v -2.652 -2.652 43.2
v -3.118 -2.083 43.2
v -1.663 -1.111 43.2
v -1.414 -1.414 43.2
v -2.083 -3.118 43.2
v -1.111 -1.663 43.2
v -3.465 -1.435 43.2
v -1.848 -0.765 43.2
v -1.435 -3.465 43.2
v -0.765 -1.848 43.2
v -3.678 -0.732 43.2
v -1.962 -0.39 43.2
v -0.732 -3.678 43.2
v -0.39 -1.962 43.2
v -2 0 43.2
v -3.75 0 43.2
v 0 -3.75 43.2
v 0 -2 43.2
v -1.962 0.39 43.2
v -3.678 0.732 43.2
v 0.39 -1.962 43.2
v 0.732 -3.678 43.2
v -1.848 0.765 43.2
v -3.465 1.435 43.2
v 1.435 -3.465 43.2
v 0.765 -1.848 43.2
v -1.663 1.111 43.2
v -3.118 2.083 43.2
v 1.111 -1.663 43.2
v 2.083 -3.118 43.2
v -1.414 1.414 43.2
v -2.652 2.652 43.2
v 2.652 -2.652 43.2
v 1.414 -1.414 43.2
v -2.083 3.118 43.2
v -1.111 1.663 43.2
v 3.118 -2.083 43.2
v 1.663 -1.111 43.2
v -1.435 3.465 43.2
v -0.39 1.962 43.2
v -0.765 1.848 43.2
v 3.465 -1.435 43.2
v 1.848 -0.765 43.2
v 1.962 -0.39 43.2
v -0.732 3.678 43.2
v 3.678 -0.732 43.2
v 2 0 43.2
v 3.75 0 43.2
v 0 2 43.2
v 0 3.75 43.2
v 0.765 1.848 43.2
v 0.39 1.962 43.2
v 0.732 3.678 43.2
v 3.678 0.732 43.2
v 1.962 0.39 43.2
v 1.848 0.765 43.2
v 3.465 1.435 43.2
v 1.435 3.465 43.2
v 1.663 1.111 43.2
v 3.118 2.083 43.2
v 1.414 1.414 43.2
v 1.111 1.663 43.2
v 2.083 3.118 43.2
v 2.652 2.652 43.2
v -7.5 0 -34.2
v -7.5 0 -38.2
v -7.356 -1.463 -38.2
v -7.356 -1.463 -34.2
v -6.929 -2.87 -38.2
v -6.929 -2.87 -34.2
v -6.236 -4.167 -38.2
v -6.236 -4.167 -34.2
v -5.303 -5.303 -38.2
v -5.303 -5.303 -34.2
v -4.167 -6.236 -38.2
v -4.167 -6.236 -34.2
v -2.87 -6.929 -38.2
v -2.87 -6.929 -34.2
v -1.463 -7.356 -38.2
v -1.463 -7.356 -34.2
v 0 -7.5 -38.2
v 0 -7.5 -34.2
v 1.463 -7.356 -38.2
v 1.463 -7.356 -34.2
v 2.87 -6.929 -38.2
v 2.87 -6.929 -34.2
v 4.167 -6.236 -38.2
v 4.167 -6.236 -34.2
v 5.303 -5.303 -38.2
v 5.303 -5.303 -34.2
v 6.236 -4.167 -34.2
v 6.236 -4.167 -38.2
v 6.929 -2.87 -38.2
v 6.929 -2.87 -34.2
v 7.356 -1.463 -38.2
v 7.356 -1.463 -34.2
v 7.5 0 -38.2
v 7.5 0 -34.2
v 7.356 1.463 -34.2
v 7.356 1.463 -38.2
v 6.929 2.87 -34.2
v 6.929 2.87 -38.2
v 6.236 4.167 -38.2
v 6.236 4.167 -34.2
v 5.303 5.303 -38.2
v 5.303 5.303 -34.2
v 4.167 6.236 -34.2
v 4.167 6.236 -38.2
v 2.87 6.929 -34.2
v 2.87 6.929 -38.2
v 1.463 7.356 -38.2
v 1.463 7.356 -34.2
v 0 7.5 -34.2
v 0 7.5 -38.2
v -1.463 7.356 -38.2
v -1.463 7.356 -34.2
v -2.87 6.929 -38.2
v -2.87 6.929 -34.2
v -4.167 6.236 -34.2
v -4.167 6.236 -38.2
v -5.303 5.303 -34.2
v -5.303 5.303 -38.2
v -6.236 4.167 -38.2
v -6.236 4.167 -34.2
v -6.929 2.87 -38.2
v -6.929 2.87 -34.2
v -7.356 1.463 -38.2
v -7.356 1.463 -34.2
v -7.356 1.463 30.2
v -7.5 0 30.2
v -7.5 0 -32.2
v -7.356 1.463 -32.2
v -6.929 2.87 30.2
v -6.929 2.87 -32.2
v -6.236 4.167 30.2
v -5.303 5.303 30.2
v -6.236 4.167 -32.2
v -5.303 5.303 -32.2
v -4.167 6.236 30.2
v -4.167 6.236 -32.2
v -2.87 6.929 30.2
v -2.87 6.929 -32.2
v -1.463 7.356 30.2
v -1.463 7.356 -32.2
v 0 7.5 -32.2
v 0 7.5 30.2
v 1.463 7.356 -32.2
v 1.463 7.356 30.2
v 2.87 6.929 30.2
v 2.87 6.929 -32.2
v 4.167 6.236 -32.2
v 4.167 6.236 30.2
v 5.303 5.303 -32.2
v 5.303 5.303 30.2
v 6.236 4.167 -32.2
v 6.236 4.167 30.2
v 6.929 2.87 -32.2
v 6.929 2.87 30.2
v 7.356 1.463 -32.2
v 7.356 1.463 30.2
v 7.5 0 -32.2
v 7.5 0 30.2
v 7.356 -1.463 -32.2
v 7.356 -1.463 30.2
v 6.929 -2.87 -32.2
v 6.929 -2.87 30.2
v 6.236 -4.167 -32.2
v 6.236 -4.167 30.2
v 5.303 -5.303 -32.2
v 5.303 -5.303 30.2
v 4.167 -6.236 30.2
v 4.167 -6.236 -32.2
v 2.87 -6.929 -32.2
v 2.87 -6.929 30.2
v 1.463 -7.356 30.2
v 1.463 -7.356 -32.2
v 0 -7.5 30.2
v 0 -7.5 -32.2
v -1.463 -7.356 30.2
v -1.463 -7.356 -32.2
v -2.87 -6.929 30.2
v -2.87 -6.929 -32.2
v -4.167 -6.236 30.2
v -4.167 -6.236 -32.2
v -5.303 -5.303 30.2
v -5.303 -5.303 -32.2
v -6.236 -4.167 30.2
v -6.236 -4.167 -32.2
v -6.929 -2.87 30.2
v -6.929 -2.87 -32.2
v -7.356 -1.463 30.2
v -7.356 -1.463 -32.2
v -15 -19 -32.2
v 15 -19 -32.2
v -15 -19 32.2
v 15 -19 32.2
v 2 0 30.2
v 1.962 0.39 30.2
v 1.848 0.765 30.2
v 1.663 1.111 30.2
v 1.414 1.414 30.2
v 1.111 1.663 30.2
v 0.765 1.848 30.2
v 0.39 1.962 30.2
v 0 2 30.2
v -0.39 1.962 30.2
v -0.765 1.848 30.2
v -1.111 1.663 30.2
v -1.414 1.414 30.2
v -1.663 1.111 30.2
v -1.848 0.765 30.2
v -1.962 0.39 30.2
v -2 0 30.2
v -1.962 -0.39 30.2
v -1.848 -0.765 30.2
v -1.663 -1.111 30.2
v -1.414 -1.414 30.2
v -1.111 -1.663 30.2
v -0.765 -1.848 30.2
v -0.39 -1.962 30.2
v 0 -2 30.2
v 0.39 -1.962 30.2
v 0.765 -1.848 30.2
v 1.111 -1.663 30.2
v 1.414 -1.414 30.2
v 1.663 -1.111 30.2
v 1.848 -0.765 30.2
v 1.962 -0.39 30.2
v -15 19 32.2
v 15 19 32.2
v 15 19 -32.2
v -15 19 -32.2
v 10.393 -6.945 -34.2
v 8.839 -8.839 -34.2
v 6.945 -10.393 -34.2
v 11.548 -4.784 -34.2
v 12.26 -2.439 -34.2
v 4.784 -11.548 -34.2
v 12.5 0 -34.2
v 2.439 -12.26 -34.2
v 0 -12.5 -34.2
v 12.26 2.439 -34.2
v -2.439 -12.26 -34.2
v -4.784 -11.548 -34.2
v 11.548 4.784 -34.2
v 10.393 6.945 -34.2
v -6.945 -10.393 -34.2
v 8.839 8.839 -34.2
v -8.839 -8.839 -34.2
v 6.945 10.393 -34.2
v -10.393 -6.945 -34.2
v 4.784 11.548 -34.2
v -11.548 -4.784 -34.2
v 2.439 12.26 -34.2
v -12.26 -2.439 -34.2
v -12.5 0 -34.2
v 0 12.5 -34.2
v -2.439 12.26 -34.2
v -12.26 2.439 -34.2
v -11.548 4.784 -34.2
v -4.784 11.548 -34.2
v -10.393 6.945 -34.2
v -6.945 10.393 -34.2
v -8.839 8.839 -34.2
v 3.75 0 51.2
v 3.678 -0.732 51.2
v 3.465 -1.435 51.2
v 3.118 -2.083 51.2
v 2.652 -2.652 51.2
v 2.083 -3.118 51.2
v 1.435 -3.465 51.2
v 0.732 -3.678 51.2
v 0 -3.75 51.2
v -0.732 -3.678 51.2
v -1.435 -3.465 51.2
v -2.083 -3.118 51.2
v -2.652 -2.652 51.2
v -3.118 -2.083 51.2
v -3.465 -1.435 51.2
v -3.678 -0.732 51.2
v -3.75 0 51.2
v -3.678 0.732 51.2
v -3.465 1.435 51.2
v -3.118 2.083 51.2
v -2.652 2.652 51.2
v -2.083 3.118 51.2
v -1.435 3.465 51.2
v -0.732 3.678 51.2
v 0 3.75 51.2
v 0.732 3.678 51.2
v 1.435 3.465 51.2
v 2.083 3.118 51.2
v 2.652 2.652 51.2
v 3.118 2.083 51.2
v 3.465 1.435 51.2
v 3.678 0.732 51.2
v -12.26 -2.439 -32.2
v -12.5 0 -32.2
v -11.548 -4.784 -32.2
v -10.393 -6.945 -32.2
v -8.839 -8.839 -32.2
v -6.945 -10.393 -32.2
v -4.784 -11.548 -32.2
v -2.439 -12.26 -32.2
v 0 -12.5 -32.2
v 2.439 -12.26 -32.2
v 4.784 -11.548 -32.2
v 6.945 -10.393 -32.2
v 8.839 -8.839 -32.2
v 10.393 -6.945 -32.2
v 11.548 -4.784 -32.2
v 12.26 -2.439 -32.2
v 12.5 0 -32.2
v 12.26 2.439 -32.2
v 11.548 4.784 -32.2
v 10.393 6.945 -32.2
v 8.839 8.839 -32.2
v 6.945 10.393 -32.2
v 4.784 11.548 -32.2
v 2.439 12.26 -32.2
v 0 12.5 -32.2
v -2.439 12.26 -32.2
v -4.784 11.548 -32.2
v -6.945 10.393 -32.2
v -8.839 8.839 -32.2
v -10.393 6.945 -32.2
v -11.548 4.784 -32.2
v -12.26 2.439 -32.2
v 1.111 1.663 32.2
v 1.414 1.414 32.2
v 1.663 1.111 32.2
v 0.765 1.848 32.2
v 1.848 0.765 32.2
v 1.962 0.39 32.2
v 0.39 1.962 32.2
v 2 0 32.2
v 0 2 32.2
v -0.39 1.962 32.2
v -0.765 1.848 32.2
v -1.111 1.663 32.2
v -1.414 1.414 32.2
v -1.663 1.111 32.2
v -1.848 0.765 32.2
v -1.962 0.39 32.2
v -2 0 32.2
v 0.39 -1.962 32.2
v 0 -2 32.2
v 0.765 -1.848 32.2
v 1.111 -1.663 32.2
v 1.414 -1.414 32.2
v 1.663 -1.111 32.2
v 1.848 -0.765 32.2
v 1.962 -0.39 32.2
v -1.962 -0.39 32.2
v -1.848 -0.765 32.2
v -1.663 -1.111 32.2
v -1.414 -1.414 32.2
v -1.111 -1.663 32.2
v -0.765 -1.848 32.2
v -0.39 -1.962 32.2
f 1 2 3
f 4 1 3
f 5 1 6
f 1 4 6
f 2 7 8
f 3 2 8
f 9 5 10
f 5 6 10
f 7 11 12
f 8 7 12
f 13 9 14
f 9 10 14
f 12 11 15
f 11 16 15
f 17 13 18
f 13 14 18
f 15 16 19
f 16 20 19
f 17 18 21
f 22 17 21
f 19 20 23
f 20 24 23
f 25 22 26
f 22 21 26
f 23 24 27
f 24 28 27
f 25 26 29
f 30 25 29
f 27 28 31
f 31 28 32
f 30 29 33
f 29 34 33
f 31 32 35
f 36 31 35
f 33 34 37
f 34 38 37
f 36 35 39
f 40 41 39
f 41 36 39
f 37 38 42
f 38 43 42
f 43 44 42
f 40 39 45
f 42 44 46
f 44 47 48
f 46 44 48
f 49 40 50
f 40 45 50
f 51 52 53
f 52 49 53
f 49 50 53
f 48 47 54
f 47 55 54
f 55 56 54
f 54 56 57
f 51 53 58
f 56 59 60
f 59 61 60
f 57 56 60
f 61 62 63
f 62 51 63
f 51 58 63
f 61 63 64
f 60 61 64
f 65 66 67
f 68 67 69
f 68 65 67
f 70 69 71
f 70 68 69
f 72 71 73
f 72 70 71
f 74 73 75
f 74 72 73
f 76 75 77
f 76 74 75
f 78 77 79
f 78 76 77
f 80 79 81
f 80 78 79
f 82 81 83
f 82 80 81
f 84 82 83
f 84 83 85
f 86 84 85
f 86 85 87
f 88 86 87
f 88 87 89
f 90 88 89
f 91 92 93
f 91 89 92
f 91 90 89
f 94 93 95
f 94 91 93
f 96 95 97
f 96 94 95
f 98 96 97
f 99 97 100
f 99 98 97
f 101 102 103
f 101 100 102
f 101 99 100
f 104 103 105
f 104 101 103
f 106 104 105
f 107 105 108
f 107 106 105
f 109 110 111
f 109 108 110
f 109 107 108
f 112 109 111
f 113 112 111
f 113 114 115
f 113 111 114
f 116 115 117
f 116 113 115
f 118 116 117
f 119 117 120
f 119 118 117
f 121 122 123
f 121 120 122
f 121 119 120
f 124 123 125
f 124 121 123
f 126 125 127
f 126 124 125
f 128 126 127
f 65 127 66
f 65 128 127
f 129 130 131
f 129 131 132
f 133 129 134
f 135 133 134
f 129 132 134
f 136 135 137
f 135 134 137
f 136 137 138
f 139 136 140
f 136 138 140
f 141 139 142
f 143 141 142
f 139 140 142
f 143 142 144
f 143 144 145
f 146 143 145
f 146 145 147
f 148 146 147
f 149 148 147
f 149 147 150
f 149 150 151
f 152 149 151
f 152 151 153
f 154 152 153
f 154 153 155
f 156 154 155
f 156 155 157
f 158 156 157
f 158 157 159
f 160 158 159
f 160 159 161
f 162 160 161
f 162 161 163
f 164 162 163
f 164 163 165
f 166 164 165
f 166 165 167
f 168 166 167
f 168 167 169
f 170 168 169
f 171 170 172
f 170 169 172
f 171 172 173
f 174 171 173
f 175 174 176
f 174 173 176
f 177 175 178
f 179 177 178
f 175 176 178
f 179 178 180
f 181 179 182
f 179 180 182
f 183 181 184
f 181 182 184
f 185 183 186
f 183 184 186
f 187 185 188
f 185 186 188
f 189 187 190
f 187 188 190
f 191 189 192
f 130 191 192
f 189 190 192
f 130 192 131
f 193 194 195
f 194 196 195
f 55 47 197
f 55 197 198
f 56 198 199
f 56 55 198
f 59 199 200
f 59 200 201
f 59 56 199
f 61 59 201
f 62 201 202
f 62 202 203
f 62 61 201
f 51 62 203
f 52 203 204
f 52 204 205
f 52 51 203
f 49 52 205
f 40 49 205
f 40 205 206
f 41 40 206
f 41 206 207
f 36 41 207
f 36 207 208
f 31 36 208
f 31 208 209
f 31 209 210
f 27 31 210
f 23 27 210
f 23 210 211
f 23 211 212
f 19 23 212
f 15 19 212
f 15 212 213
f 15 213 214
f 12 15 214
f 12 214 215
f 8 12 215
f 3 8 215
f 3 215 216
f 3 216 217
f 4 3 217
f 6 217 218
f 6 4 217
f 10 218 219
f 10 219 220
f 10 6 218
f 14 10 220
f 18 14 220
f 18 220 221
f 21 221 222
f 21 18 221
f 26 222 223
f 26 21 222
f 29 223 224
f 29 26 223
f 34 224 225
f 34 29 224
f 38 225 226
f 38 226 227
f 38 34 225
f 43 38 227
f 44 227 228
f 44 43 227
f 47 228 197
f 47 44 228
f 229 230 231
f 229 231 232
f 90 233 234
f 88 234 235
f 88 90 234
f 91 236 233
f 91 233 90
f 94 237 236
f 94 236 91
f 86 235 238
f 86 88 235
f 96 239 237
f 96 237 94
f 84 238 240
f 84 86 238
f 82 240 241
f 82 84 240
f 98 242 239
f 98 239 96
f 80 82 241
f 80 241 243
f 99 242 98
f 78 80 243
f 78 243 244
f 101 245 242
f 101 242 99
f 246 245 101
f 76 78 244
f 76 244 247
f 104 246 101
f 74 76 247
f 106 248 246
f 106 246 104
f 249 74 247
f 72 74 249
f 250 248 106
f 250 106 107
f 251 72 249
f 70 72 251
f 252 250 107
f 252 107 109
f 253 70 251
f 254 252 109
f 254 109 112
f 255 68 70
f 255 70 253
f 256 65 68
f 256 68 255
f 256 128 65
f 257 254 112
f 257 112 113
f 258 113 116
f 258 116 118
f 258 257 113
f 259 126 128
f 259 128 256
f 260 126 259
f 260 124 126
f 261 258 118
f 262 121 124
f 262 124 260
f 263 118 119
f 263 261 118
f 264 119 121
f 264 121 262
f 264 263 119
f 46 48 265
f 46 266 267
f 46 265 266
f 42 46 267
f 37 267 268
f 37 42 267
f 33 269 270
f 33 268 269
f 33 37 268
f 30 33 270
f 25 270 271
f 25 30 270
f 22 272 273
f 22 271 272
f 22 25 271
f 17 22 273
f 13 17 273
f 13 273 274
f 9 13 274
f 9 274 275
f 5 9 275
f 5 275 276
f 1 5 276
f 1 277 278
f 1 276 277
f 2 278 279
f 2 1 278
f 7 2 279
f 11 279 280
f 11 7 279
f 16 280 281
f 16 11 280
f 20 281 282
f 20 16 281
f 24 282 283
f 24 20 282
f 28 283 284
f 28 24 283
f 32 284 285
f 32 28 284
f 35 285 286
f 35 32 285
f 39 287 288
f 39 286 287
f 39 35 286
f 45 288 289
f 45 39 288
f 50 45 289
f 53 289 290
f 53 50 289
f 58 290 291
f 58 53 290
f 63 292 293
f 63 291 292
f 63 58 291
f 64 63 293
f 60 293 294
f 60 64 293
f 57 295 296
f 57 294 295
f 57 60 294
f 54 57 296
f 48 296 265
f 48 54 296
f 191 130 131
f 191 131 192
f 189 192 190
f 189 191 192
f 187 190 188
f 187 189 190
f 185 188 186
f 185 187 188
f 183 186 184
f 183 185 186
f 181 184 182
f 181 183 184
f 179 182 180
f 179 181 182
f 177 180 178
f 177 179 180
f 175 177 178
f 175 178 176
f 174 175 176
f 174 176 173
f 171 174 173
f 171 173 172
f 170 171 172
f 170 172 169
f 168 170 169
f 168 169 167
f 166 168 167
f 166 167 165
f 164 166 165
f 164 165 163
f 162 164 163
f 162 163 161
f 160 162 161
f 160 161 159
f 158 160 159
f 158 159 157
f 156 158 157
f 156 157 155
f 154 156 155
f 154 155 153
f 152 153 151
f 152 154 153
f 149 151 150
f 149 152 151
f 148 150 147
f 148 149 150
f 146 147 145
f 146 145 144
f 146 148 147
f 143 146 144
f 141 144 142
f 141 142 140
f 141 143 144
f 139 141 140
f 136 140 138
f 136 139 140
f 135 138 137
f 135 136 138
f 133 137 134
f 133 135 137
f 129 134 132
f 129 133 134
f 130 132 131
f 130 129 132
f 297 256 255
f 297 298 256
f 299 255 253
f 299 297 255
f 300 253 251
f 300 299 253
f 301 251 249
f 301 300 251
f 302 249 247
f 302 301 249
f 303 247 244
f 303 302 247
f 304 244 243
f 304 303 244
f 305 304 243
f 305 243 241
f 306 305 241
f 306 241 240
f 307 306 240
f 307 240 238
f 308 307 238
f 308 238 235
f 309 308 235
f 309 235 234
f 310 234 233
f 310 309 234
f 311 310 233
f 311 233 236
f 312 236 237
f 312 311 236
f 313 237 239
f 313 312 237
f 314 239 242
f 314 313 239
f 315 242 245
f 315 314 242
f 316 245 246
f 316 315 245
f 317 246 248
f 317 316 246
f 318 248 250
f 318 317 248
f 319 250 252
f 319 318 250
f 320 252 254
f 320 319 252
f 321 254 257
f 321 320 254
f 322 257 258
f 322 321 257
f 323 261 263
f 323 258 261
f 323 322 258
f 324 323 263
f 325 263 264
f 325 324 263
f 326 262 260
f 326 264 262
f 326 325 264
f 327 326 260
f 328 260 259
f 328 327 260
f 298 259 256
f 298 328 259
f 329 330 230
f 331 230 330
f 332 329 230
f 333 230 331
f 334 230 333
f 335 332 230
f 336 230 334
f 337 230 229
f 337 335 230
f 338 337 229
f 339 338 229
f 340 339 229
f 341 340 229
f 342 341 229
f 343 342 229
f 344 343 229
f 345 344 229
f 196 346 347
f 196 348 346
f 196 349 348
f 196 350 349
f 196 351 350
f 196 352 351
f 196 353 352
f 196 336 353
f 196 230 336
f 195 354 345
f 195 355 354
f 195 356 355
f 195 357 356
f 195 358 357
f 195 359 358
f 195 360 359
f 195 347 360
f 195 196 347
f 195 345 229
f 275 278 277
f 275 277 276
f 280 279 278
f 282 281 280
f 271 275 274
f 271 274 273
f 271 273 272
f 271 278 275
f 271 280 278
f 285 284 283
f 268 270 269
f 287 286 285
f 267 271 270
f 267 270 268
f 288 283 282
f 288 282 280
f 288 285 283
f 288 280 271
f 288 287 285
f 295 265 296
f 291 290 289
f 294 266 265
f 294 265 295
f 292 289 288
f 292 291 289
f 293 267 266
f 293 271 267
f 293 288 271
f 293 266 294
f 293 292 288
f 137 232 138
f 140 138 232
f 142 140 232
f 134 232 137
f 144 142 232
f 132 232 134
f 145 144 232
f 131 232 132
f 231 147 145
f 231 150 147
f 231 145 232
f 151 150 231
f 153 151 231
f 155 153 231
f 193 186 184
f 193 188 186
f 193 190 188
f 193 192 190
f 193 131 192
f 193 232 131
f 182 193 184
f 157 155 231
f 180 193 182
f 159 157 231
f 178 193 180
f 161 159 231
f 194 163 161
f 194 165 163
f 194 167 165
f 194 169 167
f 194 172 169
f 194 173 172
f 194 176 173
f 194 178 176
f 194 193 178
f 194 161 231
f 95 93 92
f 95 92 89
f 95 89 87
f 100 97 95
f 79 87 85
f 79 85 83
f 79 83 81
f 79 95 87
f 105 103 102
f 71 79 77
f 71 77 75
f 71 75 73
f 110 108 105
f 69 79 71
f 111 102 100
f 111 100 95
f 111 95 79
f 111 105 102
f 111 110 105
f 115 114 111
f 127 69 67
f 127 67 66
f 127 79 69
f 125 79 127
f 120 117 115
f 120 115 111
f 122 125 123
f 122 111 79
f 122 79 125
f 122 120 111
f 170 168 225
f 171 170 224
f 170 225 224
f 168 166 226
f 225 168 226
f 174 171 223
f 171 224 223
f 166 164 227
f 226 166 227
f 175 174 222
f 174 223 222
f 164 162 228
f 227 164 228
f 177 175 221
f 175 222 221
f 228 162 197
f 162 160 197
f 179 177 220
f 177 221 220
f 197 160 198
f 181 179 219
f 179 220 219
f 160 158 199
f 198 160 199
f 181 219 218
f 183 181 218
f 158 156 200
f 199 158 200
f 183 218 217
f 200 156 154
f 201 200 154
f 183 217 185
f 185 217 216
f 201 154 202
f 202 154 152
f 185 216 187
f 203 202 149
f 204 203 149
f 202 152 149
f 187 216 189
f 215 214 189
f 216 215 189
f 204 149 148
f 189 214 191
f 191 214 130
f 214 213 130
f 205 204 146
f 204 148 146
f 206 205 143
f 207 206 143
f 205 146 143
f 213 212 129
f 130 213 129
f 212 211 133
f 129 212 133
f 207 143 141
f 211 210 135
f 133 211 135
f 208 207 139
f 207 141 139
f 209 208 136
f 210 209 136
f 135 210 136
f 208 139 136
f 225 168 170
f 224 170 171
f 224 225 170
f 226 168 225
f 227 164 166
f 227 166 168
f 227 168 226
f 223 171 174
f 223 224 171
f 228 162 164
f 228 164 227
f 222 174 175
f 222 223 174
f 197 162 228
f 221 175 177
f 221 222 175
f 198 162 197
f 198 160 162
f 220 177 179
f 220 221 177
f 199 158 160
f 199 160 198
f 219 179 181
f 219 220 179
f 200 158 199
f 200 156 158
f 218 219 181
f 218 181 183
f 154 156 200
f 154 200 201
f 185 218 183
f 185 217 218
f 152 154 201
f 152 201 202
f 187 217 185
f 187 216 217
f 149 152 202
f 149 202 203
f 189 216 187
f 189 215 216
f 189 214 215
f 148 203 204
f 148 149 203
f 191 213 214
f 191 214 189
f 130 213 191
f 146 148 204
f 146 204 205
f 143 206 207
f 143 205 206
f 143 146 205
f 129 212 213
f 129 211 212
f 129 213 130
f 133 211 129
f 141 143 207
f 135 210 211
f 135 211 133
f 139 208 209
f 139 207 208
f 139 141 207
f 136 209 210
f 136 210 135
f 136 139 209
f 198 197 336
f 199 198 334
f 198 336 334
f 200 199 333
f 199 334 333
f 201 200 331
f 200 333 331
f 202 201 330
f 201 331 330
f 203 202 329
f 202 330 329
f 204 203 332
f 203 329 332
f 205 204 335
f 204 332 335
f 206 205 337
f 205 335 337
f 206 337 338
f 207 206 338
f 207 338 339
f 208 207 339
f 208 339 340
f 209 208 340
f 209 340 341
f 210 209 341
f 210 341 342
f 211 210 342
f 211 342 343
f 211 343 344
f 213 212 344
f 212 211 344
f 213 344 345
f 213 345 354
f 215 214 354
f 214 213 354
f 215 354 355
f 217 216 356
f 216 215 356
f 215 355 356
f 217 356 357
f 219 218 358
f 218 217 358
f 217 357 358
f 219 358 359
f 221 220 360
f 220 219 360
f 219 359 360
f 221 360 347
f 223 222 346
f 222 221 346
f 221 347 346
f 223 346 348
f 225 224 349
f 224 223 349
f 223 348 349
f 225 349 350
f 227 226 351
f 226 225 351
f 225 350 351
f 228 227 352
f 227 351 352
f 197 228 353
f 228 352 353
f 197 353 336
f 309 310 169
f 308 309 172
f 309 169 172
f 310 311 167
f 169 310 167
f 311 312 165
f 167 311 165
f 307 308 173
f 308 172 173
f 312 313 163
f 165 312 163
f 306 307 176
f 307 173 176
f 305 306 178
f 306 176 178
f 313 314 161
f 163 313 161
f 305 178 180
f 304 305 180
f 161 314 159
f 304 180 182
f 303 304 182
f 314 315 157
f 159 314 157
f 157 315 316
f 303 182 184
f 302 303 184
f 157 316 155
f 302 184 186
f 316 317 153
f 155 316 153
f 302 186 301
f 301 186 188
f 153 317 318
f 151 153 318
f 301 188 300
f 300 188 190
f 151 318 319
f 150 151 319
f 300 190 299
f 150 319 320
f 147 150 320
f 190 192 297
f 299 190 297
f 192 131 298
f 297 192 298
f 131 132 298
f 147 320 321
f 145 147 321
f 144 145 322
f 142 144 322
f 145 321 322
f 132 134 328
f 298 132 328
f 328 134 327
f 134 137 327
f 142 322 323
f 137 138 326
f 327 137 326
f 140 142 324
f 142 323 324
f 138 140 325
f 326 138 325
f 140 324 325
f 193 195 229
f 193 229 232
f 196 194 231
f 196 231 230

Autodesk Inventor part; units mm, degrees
ref_plane "YZ Plane" through (0, 0, 0) normal (1, 0, 0) x (0, 1, 0)
ref_plane "XZ Plane" through (0, 0, 0) normal (0, 1, 0) x (-1, 0, 0)
ref_plane "XY Plane" through (0, 0, 0) normal (0, 0, 1) x (1, 0, 0)
sketch "Sketch1" plane through (0, 0, 0) normal (0, 1, 0) x (-1, 0, 0)
  line L0 (-15, 32.2) -> (15, 32.2)
  line L1 (15, 32.2) -> (15, -32.2)
  line L2 (15, -32.2) -> (-15, -32.2)
  line L3 (-15, -32.2) -> (-15, 32.2)
  line L4 (-15, 32.2) -> (15, -32.2) construction
  line L5 (15, 32.2) -> (-15, -32.2) construction
  point P0 (0, 0)
  dimension "d0" = 30
  dimension "d1" = 64.4
extrude "Extrusion1" add sketch "Sketch1" along normal mid plane 38
sketch "Sketch4" plane through (-15, 19, 32.2) normal (0, 0, 1) x (1, 0, 0)
  circle A0 centre (15, -19) radius 2
  dimension "d10" = 4
extrude "Extrusion4" cut sketch "Sketch4" against normal through all
sketch "Sketch5" plane through (15, 19, -32.2) normal (0, 0, -1) x (-1, 0, 0)
  circle A0 centre (15, -19) radius 2 projected
  circle A1 centre (15, -19) radius 7.5
  point P0 (15, -19)
  dimension "d15" = 15
extrude "Extrusion5" cut sketch "Sketch5" against normal blind 62.4
sketch "Sketch2" plane through (-15, 19, 32.2) normal (0, 0, 1) x (1, 0, 0)
  circle A0 centre (15, -19) radius 2
  dimension "d4" = 4
extrude "Extrusion2" add sketch "Sketch2" along normal blind 11 and the other way blind 2 separate body
sketch "Sketch3" plane through (0, 0, 43.2) normal (0, 0, 1) x (1, 0, 0)
  circle A0 centre (0, 0) radius 3.75
  dimension "d7" = 7.5
extrude "Extrusion3" add sketch "Sketch3" along normal blind 8 bodies 2
sketch "Sketch6" plane through (0, 0, 30.2) normal (0, 0, -1) x (-1, 0, 0)
  circle A0 centre (0, 0) radius 7.5
  dimension "d18" = 15
extrude "Extrusion6" add sketch "Sketch6" along normal blind 68.4 bodies 2
sketch "Sketch7" plane through (15, 19, -32.2) normal (0, 0, -1) x (-1, 0, 0)
  circle A0 centre (15, -19) radius 3.75 projected
  circle A1 centre (15, -19) radius 12.5
  point P0 (15, -19)
  dimension "d21" = 25
extrude "Extrusion7" add sketch "Sketch7" along normal blind 2 bodies 2
properties part number "Solenoid"
